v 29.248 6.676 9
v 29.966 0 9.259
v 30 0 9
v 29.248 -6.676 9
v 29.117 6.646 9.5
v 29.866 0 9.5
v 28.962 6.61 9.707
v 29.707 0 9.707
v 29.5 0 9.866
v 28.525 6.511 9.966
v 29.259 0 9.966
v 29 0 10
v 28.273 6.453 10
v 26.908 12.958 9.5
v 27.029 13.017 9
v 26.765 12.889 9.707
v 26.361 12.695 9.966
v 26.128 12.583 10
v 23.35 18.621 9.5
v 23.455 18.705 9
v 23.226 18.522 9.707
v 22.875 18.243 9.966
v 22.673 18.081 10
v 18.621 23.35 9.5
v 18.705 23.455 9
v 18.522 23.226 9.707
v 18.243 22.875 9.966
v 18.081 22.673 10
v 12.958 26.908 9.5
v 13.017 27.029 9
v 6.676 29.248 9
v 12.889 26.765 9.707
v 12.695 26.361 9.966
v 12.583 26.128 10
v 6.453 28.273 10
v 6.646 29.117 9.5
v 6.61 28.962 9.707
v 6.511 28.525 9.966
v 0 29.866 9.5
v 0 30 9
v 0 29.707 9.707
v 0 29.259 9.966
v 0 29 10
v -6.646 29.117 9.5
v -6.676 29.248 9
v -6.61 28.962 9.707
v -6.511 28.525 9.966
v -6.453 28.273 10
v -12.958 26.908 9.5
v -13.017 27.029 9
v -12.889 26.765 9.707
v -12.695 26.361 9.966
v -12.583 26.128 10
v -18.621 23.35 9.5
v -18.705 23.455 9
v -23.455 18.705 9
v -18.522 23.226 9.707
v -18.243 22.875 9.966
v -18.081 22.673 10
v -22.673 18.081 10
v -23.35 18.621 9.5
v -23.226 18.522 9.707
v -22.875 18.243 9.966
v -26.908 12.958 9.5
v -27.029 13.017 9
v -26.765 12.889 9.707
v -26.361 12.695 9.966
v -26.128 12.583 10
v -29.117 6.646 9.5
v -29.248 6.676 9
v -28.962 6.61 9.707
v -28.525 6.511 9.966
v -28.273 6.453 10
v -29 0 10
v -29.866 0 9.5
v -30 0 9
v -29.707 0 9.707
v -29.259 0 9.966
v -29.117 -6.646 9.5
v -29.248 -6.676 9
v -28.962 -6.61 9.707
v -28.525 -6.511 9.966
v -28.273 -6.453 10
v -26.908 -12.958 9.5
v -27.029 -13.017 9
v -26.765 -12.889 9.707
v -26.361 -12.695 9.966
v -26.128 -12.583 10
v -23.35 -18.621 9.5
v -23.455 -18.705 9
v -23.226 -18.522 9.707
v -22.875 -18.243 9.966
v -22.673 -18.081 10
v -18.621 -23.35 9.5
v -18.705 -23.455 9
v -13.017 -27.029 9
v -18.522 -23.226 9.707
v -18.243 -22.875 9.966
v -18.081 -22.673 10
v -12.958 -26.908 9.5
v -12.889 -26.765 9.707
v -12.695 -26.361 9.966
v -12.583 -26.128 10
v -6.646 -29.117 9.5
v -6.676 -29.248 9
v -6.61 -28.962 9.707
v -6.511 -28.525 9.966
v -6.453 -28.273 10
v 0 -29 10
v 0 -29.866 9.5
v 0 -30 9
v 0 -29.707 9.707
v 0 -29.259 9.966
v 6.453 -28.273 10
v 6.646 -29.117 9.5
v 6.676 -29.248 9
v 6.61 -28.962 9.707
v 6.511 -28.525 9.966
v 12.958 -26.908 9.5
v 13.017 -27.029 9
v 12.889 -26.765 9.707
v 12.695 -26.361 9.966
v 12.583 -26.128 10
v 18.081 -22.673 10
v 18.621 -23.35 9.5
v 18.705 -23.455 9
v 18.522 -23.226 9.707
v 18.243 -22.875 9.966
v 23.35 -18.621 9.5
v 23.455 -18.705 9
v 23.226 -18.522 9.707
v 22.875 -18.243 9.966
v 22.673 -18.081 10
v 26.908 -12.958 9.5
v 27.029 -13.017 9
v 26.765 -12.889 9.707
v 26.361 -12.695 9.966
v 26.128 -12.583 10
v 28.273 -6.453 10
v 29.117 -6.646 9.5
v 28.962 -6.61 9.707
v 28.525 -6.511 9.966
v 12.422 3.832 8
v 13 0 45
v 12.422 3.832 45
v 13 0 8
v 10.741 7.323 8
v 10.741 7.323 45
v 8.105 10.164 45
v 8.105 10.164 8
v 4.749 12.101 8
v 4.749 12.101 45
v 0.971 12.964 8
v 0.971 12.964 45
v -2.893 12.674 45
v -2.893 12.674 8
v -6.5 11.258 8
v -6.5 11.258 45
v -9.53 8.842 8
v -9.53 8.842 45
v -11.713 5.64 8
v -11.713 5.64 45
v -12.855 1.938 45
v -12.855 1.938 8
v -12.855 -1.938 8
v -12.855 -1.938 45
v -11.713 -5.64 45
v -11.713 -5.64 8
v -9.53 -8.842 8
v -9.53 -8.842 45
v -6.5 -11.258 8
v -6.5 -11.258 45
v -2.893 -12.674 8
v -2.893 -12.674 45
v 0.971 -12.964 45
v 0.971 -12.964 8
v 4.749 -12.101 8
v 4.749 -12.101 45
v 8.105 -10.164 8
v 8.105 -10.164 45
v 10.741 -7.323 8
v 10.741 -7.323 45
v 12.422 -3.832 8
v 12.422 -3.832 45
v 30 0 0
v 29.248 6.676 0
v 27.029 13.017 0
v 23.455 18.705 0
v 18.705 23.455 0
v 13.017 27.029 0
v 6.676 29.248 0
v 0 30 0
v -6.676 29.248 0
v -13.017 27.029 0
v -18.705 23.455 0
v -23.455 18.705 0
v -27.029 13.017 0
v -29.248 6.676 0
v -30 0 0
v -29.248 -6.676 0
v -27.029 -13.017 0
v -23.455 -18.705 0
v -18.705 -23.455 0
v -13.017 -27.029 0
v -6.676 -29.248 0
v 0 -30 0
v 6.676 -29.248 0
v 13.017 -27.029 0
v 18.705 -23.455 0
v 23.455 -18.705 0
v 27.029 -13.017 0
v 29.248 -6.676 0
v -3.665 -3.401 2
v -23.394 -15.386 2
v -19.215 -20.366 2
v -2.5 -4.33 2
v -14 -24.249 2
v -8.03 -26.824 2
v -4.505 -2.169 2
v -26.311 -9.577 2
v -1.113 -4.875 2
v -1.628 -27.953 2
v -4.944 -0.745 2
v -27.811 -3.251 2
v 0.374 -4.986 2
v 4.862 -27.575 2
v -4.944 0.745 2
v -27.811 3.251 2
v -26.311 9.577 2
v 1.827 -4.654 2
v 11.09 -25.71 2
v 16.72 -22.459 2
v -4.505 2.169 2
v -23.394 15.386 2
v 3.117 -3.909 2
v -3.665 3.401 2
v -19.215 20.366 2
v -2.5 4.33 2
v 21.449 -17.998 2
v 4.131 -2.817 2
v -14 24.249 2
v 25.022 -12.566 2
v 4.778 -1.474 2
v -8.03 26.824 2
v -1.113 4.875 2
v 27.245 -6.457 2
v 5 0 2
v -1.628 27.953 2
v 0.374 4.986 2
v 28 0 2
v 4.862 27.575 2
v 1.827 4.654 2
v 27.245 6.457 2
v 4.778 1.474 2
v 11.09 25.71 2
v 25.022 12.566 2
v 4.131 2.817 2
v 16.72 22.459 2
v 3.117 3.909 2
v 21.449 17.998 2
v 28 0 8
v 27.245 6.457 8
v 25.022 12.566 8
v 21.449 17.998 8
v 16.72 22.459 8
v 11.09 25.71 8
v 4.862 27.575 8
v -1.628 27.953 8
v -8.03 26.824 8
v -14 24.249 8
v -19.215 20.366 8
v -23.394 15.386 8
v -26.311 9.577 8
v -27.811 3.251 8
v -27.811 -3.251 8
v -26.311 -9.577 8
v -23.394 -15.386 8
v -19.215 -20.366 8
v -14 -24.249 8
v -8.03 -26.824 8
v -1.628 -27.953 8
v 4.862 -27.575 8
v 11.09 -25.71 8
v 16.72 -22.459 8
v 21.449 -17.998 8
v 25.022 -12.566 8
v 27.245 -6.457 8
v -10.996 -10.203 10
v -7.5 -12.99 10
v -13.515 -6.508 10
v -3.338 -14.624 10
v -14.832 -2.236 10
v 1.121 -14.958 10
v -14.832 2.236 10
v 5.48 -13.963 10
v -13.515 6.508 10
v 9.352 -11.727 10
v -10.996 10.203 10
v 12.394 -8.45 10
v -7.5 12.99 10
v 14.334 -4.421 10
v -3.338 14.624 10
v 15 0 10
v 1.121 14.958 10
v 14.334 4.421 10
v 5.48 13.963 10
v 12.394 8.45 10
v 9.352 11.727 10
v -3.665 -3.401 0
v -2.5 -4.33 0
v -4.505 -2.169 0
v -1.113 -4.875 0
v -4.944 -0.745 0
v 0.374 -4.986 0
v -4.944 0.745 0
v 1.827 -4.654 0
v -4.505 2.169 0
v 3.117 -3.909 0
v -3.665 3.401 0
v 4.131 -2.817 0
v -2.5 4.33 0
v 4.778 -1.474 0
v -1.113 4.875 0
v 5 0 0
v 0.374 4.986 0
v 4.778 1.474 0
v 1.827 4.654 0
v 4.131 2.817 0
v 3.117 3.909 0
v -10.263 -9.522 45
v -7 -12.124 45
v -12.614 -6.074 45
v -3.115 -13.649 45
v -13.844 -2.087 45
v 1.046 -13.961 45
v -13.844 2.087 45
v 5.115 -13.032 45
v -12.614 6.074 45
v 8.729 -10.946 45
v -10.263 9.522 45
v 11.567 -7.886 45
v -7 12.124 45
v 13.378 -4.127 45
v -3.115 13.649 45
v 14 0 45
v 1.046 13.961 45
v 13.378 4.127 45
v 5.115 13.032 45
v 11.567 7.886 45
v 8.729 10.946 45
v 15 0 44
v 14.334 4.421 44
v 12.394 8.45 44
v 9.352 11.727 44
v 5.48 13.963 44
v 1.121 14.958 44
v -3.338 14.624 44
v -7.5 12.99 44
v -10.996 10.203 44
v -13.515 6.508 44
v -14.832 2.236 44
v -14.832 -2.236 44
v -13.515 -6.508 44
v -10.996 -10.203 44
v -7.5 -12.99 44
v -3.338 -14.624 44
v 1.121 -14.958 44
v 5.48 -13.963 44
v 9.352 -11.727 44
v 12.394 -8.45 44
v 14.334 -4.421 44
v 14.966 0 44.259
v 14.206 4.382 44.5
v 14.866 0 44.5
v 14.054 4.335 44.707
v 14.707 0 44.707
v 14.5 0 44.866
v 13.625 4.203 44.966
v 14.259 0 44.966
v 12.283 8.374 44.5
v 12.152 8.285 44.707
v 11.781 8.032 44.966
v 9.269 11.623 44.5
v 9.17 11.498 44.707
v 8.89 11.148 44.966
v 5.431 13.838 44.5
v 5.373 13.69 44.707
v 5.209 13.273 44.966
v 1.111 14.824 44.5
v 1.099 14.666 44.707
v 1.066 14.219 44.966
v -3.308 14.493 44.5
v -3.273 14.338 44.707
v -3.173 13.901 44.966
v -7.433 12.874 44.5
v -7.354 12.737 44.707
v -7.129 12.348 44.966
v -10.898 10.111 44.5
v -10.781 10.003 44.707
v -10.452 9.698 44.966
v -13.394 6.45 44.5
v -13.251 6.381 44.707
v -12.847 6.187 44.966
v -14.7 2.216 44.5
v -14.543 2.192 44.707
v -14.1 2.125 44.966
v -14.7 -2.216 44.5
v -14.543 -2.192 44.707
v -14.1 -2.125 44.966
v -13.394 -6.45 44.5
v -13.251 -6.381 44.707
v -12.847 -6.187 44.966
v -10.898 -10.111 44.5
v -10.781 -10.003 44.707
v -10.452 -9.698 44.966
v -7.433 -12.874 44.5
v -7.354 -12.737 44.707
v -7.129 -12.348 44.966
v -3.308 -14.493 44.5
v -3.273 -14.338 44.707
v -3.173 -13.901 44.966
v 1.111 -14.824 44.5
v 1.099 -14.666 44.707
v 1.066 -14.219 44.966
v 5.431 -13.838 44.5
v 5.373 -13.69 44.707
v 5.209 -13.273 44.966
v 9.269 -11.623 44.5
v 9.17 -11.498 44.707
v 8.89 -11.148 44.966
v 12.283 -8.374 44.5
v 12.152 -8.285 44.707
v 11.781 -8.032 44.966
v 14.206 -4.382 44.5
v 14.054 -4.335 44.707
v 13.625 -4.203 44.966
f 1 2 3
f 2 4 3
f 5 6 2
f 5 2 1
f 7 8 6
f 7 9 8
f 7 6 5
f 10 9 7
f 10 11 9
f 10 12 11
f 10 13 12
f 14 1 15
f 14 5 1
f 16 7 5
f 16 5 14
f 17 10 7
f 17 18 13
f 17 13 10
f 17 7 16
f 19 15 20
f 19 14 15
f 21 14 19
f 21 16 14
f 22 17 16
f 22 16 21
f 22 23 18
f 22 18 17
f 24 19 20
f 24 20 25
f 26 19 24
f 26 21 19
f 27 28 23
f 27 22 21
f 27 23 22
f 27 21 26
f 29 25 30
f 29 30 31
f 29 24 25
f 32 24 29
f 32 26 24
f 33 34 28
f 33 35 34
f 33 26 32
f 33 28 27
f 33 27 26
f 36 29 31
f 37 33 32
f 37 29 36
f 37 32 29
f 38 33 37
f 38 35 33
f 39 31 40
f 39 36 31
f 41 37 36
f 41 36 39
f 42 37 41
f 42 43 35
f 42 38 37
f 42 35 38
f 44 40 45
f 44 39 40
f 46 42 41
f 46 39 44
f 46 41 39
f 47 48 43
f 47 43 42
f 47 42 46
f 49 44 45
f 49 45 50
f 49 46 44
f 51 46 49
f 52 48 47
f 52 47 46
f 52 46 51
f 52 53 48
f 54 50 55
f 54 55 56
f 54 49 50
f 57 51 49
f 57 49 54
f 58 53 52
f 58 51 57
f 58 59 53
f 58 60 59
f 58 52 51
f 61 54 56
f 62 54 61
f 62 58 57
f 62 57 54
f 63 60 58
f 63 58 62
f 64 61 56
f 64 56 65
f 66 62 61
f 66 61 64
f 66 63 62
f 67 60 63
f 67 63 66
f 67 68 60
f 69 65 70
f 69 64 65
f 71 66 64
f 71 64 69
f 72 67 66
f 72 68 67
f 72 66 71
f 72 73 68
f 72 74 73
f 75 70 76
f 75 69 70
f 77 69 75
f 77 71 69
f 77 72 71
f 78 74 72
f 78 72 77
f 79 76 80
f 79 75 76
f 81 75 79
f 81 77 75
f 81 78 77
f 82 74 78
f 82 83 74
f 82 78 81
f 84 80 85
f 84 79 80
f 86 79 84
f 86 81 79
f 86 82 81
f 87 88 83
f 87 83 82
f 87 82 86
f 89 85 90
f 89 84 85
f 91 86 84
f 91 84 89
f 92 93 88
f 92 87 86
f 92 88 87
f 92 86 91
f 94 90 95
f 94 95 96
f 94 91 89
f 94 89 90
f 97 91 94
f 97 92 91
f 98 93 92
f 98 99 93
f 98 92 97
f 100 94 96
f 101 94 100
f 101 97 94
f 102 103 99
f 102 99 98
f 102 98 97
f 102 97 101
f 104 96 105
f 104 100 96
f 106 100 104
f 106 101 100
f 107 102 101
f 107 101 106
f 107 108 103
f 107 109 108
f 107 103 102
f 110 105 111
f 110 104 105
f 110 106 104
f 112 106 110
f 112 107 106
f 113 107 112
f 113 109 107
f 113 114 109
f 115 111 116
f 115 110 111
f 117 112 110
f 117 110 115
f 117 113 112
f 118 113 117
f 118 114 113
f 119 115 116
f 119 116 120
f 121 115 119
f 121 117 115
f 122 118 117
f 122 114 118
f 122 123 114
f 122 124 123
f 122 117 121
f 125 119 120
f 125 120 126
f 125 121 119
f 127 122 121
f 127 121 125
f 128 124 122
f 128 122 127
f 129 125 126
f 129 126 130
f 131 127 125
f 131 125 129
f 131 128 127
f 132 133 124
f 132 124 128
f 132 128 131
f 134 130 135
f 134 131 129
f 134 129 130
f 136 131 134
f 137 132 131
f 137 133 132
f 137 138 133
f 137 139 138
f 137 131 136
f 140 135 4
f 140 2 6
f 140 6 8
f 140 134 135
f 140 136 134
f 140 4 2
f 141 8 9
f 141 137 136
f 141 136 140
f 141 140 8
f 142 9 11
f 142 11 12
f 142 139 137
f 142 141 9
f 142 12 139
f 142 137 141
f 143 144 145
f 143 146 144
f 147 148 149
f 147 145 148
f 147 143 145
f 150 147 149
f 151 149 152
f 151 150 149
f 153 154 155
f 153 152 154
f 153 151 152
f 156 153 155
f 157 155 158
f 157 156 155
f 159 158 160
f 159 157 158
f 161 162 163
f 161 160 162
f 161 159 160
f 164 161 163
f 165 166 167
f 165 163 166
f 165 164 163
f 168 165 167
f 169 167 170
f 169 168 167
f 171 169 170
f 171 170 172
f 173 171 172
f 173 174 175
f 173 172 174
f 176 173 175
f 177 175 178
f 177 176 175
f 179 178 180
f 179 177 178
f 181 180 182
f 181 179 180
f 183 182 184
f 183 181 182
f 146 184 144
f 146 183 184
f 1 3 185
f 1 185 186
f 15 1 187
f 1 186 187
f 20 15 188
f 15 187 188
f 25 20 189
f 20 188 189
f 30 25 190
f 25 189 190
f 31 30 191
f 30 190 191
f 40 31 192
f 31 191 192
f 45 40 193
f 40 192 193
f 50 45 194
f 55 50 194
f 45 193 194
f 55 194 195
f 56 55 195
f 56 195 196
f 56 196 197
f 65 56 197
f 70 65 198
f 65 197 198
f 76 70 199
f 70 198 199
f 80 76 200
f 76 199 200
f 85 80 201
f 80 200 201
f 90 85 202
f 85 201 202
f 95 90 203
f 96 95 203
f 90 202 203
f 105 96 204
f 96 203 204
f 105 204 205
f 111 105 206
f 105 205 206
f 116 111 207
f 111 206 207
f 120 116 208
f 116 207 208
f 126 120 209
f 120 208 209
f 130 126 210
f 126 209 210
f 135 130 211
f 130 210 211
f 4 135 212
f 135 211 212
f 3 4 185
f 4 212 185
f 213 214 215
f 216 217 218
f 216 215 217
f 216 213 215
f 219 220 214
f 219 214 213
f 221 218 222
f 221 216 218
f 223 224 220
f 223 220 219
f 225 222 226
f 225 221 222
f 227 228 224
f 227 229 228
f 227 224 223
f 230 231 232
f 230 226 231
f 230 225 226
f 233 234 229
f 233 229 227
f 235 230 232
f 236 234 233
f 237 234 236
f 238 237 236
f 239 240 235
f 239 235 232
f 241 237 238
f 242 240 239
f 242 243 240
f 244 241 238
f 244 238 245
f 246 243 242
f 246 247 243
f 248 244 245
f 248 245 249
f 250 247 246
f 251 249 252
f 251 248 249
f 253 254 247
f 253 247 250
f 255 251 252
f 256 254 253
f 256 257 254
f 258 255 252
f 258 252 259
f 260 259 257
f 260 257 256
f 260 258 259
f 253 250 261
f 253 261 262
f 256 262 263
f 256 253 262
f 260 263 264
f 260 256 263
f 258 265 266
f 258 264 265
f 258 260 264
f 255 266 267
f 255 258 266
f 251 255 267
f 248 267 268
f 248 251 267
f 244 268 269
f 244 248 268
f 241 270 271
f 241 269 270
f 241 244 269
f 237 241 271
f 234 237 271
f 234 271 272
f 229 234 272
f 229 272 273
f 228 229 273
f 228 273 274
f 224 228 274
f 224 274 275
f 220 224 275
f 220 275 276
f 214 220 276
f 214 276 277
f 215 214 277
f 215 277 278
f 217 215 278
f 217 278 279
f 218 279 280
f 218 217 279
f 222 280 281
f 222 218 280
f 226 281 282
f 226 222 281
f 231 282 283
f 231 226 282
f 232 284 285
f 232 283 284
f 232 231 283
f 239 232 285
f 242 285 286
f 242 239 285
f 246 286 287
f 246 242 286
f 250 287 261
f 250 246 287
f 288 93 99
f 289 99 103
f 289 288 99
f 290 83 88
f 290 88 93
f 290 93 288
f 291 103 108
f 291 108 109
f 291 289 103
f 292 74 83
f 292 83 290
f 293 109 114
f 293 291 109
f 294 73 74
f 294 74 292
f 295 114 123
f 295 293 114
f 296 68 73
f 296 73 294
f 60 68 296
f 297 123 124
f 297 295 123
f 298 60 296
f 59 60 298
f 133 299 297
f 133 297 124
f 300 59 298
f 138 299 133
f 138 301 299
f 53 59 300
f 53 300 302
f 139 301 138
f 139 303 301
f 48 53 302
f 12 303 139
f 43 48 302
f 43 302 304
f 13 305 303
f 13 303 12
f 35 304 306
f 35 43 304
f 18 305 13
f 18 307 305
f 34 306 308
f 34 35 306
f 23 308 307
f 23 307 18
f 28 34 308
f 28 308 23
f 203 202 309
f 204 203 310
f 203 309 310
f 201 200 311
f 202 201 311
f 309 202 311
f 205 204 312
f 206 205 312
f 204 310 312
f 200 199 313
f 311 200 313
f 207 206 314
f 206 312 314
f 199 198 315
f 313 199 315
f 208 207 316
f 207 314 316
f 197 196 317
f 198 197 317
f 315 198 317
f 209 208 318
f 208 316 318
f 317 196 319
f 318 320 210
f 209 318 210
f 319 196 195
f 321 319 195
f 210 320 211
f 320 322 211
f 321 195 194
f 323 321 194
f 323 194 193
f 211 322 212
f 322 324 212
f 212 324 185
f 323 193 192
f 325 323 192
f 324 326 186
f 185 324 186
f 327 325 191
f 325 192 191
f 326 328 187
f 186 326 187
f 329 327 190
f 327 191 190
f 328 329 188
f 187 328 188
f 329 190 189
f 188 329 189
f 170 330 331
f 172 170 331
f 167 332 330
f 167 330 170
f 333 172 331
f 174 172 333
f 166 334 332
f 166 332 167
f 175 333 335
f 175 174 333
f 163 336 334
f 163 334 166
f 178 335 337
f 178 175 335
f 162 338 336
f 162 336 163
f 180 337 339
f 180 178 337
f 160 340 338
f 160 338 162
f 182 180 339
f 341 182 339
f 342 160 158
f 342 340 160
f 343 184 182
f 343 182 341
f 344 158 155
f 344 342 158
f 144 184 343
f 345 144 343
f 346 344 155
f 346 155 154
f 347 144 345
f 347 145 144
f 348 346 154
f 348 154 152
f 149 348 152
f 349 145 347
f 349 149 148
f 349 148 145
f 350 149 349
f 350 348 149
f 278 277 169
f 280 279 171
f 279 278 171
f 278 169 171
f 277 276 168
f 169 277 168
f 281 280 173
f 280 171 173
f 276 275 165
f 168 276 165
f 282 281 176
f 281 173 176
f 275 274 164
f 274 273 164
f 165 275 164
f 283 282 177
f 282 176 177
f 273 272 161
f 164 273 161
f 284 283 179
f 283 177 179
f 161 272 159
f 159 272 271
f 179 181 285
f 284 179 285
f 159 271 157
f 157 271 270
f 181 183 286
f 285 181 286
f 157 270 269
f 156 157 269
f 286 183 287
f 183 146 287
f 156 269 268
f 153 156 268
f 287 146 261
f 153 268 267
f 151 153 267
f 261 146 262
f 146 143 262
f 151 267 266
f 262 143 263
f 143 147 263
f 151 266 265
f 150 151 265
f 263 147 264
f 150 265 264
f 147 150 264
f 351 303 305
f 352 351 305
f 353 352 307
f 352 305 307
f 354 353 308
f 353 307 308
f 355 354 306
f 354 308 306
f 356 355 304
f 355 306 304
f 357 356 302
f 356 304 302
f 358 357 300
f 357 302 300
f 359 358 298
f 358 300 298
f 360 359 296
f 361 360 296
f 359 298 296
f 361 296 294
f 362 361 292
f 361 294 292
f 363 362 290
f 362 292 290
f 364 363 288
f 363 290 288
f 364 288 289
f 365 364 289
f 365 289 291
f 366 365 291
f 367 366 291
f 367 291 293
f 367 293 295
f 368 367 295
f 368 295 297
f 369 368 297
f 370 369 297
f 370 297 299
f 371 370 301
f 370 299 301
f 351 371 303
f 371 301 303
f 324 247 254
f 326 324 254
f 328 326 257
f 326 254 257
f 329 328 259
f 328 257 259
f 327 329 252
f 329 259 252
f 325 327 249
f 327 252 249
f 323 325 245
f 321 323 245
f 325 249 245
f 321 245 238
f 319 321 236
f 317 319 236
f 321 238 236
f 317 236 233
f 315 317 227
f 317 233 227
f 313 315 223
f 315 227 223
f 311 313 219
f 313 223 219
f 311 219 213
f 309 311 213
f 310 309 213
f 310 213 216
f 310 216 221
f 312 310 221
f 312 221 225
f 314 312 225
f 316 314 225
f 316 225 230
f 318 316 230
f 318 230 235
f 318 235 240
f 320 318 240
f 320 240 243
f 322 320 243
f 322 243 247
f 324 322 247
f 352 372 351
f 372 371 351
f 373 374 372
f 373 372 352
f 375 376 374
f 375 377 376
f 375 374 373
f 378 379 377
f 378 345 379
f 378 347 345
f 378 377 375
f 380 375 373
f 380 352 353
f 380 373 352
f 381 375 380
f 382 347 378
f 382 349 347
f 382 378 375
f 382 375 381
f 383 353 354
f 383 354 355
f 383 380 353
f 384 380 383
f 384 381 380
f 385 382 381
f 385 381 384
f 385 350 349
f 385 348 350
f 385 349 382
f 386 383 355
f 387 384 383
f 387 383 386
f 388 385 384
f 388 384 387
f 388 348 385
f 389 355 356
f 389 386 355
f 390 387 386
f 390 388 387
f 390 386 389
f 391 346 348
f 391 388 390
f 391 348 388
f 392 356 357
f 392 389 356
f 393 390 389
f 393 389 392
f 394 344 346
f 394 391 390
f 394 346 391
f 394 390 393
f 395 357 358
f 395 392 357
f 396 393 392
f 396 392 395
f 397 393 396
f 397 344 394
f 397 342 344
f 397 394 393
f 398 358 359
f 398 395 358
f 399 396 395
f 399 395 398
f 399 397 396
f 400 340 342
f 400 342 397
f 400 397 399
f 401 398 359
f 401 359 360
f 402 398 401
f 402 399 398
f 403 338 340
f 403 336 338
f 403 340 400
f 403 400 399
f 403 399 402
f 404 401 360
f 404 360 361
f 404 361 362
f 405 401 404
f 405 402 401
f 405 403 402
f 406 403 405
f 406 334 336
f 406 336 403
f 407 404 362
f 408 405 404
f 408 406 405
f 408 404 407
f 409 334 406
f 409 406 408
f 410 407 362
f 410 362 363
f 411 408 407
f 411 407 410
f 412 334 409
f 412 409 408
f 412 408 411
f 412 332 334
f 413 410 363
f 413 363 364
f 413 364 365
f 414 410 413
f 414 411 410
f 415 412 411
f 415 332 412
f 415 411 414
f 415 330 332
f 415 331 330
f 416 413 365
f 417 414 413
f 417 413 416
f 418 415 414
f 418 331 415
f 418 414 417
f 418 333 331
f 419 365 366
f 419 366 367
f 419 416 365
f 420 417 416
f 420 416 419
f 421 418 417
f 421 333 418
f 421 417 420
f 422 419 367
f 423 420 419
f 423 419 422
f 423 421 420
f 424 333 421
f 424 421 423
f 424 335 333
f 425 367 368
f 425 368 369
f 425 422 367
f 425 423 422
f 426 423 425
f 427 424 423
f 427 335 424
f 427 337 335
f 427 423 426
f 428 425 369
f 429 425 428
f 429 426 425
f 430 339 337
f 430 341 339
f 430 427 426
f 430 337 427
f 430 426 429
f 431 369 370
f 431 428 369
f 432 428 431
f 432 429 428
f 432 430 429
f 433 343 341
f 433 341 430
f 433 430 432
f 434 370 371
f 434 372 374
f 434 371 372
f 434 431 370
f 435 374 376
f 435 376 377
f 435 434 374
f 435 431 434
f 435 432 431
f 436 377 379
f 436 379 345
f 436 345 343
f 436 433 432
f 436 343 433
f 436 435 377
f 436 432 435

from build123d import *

# Parameters (mm, degrees)
CROQUIS1_R              = 30
SALIENTE_EXTRUIR1_DEPTH = 10
CROQUIS2_R              = 15
SALIENTE_EXTRUIR2_DEPTH = 35
VACIADO1_T              = -2
REDONDEO1_R             = 1
REDONDEO2_R             = 1
CORTAR_EXTRUIR1_REACH   = 62.407
CROQUIS3_R              = 5


with BuildPart() as part:
    # Croquis1 → Saliente-Extruir1 (new body)
    with BuildSketch(Plane.XY):
        Circle(CROQUIS1_R)
    extrude(amount=SALIENTE_EXTRUIR1_DEPTH)

    # Croquis2 → Saliente-Extruir2 (add)
    with BuildSketch(Plane.XY.offset(10)):
        Circle(CROQUIS2_R)
    extrude(amount=SALIENTE_EXTRUIR2_DEPTH)

    # Vaciado1
    vaciado1_openings = [part.faces().sort_by_distance(p)[0] for p in [
        (0, 0, 45),
    ]]
    offset(amount=VACIADO1_T, openings=vaciado1_openings, kind=Kind.INTERSECTION)

    # Redondeo1
    redondeo1_edges = [part.edges().sort_by_distance(p)[0] for p in [
        (-30, 0, 10),
    ]]
    fillet(redondeo1_edges, radius=REDONDEO1_R)

    # Redondeo2
    redondeo2_edges = [part.edges().sort_by_distance(p)[0] for p in [
        (-15, 0, 45),
    ]]
    fillet(redondeo2_edges, radius=REDONDEO2_R)

    # Croquis3 → Cortar-Extruir1 (cut, up to next)
    with BuildSketch(Plane.XY.offset(2), mode=Mode.PRIVATE) as cortar_extruir1_sk1:
        Circle(CROQUIS3_R)
    cortar_extruir1_tool1 = extrude(cortar_extruir1_sk1.sketch, amount=-CORTAR_EXTRUIR1_REACH, mode=Mode.PRIVATE) & part.part
    add(cortar_extruir1_tool1.solids().sort_by_distance((0, 0, 2))[0], mode=Mode.SUBTRACT)


solid = part.part
